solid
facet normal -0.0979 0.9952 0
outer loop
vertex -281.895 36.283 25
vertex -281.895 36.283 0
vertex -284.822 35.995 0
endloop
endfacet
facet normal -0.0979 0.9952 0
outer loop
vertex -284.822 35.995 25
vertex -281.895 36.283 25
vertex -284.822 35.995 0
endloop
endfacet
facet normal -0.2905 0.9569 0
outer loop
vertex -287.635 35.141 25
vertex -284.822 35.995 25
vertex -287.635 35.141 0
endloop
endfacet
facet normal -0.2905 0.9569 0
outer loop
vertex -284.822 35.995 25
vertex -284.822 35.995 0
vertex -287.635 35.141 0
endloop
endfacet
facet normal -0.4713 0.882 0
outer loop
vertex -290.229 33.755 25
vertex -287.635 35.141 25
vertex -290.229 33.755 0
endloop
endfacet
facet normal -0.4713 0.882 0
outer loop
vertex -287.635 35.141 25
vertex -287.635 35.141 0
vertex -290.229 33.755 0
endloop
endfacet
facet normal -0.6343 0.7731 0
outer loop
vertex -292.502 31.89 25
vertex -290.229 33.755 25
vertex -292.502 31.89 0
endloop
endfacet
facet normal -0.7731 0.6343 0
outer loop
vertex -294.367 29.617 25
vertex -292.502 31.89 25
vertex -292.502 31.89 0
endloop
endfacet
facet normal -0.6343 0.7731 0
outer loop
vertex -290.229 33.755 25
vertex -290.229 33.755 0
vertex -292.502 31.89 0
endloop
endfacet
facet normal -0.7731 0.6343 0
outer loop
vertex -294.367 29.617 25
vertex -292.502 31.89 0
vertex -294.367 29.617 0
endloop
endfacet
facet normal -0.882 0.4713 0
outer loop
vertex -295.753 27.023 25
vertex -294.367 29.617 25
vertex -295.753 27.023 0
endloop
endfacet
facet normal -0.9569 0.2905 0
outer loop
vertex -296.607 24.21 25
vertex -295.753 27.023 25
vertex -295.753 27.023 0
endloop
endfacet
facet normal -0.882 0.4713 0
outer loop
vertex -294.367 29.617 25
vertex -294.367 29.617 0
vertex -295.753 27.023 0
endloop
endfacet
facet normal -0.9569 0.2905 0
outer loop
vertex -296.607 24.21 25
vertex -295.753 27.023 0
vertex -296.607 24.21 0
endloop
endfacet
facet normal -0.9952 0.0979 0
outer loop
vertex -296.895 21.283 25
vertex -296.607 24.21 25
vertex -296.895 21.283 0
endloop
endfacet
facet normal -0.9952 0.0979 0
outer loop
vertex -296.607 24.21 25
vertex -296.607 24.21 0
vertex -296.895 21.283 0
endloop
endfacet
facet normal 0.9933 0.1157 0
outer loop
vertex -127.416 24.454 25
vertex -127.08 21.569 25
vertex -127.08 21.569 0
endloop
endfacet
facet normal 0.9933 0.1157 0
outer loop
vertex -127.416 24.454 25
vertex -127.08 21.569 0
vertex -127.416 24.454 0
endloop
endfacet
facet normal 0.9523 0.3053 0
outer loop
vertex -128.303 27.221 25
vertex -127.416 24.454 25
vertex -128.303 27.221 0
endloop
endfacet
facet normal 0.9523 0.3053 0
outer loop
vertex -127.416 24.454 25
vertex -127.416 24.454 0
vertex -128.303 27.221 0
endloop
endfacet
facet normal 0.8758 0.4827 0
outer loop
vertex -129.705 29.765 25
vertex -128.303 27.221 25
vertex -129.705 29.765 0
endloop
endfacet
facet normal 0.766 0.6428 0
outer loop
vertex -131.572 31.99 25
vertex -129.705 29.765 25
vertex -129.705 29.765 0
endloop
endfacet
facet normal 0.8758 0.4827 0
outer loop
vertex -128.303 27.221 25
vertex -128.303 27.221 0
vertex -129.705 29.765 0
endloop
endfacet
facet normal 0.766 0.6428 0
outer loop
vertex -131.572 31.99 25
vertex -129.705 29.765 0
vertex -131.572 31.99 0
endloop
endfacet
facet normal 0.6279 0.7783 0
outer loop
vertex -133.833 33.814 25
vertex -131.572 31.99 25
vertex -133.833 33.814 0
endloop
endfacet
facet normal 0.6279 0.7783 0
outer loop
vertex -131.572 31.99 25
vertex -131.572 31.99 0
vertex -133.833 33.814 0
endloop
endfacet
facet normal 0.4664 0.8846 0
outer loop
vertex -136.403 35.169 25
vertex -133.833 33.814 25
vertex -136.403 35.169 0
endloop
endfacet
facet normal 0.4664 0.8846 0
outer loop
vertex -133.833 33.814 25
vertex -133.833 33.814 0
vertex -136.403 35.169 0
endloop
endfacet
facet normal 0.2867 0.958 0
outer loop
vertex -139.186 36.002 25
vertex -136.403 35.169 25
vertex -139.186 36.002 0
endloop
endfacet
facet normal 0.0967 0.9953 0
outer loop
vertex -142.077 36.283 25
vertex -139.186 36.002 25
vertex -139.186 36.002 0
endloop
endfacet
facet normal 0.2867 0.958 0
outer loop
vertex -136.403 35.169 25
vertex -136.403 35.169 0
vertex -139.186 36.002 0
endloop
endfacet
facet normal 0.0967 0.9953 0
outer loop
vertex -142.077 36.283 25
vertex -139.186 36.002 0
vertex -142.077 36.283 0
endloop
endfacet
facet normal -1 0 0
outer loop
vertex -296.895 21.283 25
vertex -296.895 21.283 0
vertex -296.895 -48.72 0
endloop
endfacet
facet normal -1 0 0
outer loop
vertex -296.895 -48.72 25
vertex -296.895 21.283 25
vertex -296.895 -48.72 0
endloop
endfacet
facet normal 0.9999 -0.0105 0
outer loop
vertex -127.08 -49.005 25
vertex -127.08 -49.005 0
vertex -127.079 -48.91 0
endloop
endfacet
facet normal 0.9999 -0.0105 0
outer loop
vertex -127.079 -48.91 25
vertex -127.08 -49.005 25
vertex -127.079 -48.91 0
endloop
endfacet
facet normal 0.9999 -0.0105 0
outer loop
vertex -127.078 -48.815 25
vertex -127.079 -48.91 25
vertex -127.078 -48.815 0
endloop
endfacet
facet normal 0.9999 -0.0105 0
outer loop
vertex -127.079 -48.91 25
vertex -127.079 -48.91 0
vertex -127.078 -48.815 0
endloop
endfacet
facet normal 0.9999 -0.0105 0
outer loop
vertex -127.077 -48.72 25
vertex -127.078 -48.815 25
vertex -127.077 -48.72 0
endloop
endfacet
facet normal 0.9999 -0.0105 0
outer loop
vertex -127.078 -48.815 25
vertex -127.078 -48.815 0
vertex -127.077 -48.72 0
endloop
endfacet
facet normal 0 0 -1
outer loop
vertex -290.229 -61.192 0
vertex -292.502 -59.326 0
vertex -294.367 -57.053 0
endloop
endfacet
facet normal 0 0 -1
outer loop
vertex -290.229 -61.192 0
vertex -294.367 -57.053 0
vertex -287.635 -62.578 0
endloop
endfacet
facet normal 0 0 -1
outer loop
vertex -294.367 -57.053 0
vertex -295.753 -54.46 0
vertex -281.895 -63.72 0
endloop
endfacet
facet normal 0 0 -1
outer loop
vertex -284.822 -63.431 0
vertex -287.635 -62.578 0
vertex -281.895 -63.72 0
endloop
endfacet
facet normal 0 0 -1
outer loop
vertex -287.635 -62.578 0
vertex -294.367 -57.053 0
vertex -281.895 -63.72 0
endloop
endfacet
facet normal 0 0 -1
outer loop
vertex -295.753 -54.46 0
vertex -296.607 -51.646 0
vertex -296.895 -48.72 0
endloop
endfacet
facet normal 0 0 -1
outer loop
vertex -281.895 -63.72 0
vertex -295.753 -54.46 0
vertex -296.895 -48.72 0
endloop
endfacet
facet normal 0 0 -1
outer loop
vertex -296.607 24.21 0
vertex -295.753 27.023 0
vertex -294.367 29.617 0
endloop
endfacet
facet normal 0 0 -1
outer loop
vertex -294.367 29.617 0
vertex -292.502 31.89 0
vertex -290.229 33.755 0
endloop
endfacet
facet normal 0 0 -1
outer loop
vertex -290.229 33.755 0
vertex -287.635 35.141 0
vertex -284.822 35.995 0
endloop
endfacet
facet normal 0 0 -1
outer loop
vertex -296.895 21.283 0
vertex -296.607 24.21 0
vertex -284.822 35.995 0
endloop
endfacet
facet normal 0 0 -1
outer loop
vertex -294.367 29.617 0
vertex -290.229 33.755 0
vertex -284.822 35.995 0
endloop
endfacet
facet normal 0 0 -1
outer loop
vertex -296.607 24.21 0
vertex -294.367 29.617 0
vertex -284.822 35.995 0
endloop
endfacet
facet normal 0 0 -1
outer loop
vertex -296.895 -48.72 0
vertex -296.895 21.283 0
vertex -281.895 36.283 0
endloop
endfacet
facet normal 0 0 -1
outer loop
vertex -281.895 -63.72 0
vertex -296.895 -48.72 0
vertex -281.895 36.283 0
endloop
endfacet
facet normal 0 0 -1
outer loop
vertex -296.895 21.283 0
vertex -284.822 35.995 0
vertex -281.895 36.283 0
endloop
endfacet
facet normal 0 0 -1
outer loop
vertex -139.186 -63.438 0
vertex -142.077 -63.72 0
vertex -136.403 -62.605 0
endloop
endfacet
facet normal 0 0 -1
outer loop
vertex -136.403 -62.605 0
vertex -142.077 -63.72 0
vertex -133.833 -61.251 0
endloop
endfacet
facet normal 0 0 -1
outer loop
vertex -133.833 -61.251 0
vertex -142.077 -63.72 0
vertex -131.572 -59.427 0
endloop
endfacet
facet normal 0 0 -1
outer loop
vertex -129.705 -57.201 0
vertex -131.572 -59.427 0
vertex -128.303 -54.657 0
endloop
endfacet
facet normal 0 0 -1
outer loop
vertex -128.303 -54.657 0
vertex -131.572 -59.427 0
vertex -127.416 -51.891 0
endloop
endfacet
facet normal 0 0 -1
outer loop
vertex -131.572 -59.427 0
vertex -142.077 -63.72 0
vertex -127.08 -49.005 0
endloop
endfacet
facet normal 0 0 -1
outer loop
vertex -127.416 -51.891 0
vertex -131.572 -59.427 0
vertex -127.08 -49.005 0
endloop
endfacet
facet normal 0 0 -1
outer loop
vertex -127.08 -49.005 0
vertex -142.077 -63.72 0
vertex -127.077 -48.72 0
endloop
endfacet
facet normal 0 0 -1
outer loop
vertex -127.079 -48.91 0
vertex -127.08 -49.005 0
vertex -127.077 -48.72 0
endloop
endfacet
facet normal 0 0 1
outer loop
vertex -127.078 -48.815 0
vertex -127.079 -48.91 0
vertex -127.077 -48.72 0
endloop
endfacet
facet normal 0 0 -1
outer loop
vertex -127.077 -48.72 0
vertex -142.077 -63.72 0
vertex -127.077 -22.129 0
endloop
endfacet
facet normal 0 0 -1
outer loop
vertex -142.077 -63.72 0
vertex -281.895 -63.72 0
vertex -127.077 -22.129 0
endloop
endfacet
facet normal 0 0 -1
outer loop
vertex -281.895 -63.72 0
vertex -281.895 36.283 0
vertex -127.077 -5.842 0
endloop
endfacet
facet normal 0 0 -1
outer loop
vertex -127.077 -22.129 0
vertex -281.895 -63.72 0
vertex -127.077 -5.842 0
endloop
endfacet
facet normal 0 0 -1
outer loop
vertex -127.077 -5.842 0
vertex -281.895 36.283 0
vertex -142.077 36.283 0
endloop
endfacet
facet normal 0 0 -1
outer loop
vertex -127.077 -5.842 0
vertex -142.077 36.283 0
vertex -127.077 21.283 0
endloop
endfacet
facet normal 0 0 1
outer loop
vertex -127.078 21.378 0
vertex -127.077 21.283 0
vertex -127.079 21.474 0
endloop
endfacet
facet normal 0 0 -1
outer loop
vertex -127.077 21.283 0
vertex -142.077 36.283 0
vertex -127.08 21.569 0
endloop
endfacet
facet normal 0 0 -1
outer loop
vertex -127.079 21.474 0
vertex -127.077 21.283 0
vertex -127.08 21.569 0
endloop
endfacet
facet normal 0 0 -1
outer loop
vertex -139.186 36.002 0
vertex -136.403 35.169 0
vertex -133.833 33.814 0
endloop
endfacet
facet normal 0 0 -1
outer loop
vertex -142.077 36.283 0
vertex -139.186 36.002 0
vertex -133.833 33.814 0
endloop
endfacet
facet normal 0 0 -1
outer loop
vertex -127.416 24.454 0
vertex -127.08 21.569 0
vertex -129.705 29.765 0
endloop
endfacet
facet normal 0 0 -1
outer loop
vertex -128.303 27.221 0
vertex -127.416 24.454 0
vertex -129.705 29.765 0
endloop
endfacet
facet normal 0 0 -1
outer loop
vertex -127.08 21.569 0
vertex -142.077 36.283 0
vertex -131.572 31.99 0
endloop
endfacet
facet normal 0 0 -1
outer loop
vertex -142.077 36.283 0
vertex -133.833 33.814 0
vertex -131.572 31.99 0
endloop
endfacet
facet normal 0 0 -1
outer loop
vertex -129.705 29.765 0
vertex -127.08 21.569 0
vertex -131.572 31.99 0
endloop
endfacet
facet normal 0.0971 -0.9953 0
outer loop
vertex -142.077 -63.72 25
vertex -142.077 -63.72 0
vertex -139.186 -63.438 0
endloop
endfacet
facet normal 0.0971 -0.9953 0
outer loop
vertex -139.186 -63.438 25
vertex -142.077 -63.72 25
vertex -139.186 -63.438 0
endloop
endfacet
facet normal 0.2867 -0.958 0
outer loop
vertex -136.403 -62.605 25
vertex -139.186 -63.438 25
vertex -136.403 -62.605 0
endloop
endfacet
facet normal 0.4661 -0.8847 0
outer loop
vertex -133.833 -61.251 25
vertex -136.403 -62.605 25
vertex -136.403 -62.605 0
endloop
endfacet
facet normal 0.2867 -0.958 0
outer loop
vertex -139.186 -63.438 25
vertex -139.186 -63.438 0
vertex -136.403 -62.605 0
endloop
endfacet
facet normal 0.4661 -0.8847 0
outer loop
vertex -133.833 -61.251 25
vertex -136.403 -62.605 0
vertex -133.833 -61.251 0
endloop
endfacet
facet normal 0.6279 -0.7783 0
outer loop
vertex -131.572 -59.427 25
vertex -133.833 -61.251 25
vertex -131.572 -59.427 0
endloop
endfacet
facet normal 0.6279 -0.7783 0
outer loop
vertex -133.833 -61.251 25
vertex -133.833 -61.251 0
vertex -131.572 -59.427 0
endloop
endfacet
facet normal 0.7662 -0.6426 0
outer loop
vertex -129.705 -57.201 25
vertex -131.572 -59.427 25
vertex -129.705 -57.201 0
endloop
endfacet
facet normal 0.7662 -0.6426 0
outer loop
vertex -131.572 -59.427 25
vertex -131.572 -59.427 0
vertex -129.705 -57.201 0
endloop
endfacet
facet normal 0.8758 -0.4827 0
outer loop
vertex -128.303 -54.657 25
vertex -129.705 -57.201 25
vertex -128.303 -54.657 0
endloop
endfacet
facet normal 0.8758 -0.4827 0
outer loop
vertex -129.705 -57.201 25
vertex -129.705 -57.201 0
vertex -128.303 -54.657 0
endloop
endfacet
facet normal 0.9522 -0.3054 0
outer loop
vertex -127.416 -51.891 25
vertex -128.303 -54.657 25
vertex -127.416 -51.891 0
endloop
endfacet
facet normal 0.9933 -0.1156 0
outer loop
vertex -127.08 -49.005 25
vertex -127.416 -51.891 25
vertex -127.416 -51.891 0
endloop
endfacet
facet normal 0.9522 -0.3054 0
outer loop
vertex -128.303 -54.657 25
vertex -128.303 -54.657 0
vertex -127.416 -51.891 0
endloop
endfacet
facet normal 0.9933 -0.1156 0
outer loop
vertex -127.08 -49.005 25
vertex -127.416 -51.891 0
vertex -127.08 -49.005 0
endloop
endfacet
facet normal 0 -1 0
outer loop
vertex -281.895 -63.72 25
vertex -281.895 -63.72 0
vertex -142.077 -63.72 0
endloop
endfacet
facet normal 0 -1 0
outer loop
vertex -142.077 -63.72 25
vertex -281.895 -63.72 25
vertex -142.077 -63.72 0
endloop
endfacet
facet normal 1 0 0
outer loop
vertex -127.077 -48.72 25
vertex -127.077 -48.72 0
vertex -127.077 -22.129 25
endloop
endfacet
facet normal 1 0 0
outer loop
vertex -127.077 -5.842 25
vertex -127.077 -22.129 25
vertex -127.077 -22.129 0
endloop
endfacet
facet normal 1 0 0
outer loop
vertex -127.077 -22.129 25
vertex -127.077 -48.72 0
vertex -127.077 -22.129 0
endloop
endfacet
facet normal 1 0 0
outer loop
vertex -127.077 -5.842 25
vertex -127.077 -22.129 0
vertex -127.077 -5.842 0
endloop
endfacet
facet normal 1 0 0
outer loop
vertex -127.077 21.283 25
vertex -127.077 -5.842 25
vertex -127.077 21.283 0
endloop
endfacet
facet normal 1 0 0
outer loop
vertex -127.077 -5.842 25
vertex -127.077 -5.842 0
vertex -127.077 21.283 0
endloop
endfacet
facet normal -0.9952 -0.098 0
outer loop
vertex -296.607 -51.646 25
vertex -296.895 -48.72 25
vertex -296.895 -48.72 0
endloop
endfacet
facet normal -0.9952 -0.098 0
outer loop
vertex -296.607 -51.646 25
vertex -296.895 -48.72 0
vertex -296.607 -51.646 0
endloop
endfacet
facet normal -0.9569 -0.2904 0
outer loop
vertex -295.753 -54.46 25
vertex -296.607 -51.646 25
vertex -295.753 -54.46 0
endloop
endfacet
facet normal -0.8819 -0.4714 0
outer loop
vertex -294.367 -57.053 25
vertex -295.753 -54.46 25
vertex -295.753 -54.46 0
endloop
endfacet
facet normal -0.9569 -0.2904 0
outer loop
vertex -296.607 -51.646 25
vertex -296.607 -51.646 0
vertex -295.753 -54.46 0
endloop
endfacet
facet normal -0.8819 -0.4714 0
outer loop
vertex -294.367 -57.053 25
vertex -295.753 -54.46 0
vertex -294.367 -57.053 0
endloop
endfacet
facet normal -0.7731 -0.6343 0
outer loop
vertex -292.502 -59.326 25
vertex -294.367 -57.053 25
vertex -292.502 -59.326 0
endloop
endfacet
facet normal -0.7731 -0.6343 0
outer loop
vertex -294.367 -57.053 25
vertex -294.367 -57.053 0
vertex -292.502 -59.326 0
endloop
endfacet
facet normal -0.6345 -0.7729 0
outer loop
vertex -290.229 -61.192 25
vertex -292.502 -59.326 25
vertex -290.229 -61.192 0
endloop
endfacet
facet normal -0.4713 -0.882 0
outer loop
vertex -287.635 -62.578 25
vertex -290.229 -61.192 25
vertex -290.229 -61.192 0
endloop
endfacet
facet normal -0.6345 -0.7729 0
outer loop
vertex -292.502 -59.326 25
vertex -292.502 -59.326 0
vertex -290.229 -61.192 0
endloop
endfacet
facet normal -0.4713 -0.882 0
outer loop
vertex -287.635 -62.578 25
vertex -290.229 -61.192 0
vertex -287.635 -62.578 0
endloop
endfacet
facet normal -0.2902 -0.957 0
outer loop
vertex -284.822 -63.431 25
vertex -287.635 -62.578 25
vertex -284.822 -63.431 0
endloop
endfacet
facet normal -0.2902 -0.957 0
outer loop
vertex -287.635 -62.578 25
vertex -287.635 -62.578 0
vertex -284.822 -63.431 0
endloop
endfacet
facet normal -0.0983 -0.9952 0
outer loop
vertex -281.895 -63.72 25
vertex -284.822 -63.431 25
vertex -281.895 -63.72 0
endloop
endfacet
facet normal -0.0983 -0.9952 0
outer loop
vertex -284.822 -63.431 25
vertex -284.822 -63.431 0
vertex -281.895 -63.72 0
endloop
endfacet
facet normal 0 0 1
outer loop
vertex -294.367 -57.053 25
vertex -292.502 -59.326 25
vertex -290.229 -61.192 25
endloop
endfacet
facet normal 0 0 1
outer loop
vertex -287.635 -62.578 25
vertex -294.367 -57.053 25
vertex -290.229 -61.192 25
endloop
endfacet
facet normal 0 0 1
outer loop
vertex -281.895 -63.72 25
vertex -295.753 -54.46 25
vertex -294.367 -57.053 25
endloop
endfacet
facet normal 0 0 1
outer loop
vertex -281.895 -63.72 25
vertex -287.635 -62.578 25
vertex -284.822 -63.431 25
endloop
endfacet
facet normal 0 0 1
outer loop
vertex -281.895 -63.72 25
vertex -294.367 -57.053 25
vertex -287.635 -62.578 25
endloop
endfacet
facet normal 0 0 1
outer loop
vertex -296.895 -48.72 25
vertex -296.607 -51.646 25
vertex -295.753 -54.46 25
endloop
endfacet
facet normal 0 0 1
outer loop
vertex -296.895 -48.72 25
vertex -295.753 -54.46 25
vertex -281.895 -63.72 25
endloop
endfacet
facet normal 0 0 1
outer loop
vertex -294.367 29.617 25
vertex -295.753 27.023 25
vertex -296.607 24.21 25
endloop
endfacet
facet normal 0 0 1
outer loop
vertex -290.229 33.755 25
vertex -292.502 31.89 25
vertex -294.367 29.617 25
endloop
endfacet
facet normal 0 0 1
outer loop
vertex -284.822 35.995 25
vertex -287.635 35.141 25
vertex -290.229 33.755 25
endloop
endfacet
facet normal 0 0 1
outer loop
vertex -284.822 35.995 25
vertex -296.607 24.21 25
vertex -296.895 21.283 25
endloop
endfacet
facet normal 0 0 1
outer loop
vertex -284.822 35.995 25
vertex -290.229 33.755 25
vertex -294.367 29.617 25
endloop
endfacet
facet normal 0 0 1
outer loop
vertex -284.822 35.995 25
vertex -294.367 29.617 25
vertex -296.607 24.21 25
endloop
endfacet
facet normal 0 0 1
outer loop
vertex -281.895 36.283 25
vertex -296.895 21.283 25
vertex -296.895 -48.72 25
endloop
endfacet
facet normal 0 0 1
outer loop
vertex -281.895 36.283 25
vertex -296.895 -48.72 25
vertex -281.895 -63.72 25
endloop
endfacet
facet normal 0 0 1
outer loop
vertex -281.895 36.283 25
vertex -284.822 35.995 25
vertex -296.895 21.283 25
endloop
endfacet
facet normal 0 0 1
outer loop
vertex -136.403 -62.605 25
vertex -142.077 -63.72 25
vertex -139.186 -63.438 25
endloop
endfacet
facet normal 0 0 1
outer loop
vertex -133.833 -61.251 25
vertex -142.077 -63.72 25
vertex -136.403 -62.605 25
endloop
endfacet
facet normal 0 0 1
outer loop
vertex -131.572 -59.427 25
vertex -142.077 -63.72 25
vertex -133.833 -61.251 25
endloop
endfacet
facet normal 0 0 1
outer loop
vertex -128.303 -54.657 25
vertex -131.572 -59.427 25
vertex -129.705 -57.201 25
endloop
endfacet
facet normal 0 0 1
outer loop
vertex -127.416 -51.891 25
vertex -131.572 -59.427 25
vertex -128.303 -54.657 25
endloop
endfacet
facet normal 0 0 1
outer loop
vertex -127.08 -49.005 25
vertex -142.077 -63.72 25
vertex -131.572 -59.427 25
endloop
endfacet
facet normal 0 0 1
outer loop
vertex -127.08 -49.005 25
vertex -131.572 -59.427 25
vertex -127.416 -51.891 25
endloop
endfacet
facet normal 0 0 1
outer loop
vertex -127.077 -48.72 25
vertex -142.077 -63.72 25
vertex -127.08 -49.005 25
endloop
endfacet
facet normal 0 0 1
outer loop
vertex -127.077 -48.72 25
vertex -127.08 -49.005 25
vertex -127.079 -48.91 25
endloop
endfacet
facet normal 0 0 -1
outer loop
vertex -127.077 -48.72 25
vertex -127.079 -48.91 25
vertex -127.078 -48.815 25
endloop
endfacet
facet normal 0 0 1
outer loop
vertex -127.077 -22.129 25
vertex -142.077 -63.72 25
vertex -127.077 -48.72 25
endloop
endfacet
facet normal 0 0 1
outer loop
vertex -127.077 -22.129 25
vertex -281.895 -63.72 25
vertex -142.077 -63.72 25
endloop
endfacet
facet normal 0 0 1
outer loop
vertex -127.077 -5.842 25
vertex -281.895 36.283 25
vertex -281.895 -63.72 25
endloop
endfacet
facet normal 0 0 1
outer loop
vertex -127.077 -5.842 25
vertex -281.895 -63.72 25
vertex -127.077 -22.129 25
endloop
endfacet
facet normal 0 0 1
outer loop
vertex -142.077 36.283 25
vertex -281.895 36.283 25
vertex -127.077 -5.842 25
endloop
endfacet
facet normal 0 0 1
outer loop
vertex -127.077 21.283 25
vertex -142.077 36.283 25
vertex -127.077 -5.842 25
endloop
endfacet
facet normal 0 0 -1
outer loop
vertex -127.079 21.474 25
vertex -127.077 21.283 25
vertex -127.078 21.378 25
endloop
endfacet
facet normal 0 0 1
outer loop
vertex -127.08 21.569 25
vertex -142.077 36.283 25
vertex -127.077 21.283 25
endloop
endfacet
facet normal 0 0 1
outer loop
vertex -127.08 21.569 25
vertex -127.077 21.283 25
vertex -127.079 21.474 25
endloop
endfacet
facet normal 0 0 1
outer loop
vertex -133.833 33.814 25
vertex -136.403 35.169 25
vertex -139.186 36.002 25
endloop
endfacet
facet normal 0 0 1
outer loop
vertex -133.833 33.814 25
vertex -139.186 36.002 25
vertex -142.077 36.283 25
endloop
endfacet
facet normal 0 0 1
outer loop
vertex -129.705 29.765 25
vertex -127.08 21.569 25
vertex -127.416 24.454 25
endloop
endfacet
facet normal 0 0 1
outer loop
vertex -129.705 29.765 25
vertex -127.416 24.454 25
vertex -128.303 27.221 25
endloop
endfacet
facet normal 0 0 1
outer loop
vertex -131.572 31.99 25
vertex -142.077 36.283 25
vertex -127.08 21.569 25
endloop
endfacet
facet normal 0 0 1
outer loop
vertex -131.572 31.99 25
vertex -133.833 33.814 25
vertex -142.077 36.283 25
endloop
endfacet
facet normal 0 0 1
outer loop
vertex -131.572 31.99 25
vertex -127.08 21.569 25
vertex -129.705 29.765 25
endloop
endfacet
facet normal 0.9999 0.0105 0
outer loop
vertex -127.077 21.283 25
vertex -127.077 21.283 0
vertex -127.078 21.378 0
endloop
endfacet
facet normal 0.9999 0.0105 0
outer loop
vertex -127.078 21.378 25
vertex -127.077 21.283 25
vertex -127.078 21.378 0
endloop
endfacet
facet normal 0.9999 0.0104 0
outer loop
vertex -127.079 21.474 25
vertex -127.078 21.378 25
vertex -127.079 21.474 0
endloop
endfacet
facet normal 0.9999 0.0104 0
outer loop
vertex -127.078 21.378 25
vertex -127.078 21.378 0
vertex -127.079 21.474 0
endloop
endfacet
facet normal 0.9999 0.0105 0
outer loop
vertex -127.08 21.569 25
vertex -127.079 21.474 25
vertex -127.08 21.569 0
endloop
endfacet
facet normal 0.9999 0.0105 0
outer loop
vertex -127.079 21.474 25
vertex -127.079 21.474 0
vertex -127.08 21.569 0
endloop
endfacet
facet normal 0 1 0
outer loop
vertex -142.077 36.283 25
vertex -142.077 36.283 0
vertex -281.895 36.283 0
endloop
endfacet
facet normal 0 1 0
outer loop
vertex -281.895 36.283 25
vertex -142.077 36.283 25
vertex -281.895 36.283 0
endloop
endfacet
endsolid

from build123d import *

# Parameters (mm, degrees)
F0_W     = 27.1898097297
F0_H     = 16.2868271582
F1_DEPTH = 25


with BuildPart() as f1:
    # F0 (on Top) → F1 (new body)
    with BuildSketch(Plane.XY):
        with BuildLine():
            ThreePointArc((-296.8951798975, -48.7195744038), (-292.5017816153, -59.3261761216), (-281.8951798975, -63.7195744038))
            Line((-281.8951798975, -63.7195744038), (-142.0774715642, -63.7195744038))
            ThreePointArc((-142.0774715642, -63.7195744038), (-131.5723208853, -59.4266659422), (-127.0801902383, -49.0051489655))
            ThreePointArc((-127.0801902383, -49.0051489655), (-162.3644421178, -13.7181785166), (-127.0801902383, 21.5687919322))
            ThreePointArc((-127.0801902383, 21.5687919322), (-131.5723208853, 31.990308909), (-142.0774715642, 36.2832173705))
            Line((-142.0774715642, 36.2832173705), (-281.8951798975, 36.2832173705))
            ThreePointArc((-281.8951798975, 36.2832173705), (-292.5017816153, 31.8898190883), (-296.8951798975, 21.2832173705))
            Line((-296.8951798975, 21.2832173705), (-296.8951798975, 21.2820385972))
            ThreePointArc((-296.8951798975, 21.2820385972), (-261.8949627837, -13.7181785166), (-296.8951798975, -48.7183956304))
            Line((-296.8951798975, -48.7183956304), (-296.8951798975, -48.7195744038))
        make_face()
        Polygon((-296.8951798975, -21.1222618818), (-296.8951798975, -22.4110819399), (-274.3184268475, -22.4110819399), (-274.3184268475, -5.8417902328), (-296.8951798975, -5.8417902328), align=None)
        with Locations((-140.672376429, -13.9852038119)):
            Rectangle(F0_W, F0_H)
        with BuildLine():
            Line((-296.8951798975, -35.9437018633), (-296.8951798975, -48.7183956304))
            ThreePointArc((-296.8951798975, -48.7183956304), (-261.8949627837, -13.7181785166), (-296.8951798975, 21.2820385972))
            Line((-296.8951798975, 21.2820385972), (-296.8951798975, 0))
            Line((-296.8951798975, 0), (-296.8951798975, -5.8417902328))
            Line((-296.8951798975, -5.8417902328), (-274.3184268475, -5.8417902328))
            Line((-274.3184268475, -5.8417902328), (-274.3184268475, -22.4110819399))
            Line((-274.3184268475, -22.4110819399), (-296.8951798975, -22.4110819399))
            Line((-296.8951798975, -22.4110819399), (-296.8951798975, -35.9437018633))
        make_face()
        with BuildLine():
            ThreePointArc((-127.0801902383, 21.5687919322), (-162.3644421178, -13.7181785166), (-127.0801902383, -49.0051489655))
            ThreePointArc((-127.0801902383, -49.0051489655), (-127.0781512481, -48.8623681549), (-127.0774715642, -48.7195744038))
            Line((-127.0774715642, -48.7195744038), (-127.0774715642, -36.2968184054))
            Line((-127.0774715642, -36.2968184054), (-127.0774715642, -22.4110819399))
            Line((-127.0774715642, -22.4110819399), (-127.0774715642, -22.128617391))
            Line((-127.0774715642, -22.128617391), (-154.2672812939, -22.128617391))
            Line((-154.2672812939, -22.128617391), (-154.2672812939, -5.8417902328))
            Line((-154.2672812939, -5.8417902328), (-127.0774715642, -5.8417902328))
            Line((-127.0774715642, -5.8417902328), (-127.0774715642, 21.2832173705))
            ThreePointArc((-127.0774715642, 21.2832173705), (-127.0781512481, 21.4260111217), (-127.0801902383, 21.5687919322))
        make_face()
    extrude(amount=F1_DEPTH)


solid = f1.part
